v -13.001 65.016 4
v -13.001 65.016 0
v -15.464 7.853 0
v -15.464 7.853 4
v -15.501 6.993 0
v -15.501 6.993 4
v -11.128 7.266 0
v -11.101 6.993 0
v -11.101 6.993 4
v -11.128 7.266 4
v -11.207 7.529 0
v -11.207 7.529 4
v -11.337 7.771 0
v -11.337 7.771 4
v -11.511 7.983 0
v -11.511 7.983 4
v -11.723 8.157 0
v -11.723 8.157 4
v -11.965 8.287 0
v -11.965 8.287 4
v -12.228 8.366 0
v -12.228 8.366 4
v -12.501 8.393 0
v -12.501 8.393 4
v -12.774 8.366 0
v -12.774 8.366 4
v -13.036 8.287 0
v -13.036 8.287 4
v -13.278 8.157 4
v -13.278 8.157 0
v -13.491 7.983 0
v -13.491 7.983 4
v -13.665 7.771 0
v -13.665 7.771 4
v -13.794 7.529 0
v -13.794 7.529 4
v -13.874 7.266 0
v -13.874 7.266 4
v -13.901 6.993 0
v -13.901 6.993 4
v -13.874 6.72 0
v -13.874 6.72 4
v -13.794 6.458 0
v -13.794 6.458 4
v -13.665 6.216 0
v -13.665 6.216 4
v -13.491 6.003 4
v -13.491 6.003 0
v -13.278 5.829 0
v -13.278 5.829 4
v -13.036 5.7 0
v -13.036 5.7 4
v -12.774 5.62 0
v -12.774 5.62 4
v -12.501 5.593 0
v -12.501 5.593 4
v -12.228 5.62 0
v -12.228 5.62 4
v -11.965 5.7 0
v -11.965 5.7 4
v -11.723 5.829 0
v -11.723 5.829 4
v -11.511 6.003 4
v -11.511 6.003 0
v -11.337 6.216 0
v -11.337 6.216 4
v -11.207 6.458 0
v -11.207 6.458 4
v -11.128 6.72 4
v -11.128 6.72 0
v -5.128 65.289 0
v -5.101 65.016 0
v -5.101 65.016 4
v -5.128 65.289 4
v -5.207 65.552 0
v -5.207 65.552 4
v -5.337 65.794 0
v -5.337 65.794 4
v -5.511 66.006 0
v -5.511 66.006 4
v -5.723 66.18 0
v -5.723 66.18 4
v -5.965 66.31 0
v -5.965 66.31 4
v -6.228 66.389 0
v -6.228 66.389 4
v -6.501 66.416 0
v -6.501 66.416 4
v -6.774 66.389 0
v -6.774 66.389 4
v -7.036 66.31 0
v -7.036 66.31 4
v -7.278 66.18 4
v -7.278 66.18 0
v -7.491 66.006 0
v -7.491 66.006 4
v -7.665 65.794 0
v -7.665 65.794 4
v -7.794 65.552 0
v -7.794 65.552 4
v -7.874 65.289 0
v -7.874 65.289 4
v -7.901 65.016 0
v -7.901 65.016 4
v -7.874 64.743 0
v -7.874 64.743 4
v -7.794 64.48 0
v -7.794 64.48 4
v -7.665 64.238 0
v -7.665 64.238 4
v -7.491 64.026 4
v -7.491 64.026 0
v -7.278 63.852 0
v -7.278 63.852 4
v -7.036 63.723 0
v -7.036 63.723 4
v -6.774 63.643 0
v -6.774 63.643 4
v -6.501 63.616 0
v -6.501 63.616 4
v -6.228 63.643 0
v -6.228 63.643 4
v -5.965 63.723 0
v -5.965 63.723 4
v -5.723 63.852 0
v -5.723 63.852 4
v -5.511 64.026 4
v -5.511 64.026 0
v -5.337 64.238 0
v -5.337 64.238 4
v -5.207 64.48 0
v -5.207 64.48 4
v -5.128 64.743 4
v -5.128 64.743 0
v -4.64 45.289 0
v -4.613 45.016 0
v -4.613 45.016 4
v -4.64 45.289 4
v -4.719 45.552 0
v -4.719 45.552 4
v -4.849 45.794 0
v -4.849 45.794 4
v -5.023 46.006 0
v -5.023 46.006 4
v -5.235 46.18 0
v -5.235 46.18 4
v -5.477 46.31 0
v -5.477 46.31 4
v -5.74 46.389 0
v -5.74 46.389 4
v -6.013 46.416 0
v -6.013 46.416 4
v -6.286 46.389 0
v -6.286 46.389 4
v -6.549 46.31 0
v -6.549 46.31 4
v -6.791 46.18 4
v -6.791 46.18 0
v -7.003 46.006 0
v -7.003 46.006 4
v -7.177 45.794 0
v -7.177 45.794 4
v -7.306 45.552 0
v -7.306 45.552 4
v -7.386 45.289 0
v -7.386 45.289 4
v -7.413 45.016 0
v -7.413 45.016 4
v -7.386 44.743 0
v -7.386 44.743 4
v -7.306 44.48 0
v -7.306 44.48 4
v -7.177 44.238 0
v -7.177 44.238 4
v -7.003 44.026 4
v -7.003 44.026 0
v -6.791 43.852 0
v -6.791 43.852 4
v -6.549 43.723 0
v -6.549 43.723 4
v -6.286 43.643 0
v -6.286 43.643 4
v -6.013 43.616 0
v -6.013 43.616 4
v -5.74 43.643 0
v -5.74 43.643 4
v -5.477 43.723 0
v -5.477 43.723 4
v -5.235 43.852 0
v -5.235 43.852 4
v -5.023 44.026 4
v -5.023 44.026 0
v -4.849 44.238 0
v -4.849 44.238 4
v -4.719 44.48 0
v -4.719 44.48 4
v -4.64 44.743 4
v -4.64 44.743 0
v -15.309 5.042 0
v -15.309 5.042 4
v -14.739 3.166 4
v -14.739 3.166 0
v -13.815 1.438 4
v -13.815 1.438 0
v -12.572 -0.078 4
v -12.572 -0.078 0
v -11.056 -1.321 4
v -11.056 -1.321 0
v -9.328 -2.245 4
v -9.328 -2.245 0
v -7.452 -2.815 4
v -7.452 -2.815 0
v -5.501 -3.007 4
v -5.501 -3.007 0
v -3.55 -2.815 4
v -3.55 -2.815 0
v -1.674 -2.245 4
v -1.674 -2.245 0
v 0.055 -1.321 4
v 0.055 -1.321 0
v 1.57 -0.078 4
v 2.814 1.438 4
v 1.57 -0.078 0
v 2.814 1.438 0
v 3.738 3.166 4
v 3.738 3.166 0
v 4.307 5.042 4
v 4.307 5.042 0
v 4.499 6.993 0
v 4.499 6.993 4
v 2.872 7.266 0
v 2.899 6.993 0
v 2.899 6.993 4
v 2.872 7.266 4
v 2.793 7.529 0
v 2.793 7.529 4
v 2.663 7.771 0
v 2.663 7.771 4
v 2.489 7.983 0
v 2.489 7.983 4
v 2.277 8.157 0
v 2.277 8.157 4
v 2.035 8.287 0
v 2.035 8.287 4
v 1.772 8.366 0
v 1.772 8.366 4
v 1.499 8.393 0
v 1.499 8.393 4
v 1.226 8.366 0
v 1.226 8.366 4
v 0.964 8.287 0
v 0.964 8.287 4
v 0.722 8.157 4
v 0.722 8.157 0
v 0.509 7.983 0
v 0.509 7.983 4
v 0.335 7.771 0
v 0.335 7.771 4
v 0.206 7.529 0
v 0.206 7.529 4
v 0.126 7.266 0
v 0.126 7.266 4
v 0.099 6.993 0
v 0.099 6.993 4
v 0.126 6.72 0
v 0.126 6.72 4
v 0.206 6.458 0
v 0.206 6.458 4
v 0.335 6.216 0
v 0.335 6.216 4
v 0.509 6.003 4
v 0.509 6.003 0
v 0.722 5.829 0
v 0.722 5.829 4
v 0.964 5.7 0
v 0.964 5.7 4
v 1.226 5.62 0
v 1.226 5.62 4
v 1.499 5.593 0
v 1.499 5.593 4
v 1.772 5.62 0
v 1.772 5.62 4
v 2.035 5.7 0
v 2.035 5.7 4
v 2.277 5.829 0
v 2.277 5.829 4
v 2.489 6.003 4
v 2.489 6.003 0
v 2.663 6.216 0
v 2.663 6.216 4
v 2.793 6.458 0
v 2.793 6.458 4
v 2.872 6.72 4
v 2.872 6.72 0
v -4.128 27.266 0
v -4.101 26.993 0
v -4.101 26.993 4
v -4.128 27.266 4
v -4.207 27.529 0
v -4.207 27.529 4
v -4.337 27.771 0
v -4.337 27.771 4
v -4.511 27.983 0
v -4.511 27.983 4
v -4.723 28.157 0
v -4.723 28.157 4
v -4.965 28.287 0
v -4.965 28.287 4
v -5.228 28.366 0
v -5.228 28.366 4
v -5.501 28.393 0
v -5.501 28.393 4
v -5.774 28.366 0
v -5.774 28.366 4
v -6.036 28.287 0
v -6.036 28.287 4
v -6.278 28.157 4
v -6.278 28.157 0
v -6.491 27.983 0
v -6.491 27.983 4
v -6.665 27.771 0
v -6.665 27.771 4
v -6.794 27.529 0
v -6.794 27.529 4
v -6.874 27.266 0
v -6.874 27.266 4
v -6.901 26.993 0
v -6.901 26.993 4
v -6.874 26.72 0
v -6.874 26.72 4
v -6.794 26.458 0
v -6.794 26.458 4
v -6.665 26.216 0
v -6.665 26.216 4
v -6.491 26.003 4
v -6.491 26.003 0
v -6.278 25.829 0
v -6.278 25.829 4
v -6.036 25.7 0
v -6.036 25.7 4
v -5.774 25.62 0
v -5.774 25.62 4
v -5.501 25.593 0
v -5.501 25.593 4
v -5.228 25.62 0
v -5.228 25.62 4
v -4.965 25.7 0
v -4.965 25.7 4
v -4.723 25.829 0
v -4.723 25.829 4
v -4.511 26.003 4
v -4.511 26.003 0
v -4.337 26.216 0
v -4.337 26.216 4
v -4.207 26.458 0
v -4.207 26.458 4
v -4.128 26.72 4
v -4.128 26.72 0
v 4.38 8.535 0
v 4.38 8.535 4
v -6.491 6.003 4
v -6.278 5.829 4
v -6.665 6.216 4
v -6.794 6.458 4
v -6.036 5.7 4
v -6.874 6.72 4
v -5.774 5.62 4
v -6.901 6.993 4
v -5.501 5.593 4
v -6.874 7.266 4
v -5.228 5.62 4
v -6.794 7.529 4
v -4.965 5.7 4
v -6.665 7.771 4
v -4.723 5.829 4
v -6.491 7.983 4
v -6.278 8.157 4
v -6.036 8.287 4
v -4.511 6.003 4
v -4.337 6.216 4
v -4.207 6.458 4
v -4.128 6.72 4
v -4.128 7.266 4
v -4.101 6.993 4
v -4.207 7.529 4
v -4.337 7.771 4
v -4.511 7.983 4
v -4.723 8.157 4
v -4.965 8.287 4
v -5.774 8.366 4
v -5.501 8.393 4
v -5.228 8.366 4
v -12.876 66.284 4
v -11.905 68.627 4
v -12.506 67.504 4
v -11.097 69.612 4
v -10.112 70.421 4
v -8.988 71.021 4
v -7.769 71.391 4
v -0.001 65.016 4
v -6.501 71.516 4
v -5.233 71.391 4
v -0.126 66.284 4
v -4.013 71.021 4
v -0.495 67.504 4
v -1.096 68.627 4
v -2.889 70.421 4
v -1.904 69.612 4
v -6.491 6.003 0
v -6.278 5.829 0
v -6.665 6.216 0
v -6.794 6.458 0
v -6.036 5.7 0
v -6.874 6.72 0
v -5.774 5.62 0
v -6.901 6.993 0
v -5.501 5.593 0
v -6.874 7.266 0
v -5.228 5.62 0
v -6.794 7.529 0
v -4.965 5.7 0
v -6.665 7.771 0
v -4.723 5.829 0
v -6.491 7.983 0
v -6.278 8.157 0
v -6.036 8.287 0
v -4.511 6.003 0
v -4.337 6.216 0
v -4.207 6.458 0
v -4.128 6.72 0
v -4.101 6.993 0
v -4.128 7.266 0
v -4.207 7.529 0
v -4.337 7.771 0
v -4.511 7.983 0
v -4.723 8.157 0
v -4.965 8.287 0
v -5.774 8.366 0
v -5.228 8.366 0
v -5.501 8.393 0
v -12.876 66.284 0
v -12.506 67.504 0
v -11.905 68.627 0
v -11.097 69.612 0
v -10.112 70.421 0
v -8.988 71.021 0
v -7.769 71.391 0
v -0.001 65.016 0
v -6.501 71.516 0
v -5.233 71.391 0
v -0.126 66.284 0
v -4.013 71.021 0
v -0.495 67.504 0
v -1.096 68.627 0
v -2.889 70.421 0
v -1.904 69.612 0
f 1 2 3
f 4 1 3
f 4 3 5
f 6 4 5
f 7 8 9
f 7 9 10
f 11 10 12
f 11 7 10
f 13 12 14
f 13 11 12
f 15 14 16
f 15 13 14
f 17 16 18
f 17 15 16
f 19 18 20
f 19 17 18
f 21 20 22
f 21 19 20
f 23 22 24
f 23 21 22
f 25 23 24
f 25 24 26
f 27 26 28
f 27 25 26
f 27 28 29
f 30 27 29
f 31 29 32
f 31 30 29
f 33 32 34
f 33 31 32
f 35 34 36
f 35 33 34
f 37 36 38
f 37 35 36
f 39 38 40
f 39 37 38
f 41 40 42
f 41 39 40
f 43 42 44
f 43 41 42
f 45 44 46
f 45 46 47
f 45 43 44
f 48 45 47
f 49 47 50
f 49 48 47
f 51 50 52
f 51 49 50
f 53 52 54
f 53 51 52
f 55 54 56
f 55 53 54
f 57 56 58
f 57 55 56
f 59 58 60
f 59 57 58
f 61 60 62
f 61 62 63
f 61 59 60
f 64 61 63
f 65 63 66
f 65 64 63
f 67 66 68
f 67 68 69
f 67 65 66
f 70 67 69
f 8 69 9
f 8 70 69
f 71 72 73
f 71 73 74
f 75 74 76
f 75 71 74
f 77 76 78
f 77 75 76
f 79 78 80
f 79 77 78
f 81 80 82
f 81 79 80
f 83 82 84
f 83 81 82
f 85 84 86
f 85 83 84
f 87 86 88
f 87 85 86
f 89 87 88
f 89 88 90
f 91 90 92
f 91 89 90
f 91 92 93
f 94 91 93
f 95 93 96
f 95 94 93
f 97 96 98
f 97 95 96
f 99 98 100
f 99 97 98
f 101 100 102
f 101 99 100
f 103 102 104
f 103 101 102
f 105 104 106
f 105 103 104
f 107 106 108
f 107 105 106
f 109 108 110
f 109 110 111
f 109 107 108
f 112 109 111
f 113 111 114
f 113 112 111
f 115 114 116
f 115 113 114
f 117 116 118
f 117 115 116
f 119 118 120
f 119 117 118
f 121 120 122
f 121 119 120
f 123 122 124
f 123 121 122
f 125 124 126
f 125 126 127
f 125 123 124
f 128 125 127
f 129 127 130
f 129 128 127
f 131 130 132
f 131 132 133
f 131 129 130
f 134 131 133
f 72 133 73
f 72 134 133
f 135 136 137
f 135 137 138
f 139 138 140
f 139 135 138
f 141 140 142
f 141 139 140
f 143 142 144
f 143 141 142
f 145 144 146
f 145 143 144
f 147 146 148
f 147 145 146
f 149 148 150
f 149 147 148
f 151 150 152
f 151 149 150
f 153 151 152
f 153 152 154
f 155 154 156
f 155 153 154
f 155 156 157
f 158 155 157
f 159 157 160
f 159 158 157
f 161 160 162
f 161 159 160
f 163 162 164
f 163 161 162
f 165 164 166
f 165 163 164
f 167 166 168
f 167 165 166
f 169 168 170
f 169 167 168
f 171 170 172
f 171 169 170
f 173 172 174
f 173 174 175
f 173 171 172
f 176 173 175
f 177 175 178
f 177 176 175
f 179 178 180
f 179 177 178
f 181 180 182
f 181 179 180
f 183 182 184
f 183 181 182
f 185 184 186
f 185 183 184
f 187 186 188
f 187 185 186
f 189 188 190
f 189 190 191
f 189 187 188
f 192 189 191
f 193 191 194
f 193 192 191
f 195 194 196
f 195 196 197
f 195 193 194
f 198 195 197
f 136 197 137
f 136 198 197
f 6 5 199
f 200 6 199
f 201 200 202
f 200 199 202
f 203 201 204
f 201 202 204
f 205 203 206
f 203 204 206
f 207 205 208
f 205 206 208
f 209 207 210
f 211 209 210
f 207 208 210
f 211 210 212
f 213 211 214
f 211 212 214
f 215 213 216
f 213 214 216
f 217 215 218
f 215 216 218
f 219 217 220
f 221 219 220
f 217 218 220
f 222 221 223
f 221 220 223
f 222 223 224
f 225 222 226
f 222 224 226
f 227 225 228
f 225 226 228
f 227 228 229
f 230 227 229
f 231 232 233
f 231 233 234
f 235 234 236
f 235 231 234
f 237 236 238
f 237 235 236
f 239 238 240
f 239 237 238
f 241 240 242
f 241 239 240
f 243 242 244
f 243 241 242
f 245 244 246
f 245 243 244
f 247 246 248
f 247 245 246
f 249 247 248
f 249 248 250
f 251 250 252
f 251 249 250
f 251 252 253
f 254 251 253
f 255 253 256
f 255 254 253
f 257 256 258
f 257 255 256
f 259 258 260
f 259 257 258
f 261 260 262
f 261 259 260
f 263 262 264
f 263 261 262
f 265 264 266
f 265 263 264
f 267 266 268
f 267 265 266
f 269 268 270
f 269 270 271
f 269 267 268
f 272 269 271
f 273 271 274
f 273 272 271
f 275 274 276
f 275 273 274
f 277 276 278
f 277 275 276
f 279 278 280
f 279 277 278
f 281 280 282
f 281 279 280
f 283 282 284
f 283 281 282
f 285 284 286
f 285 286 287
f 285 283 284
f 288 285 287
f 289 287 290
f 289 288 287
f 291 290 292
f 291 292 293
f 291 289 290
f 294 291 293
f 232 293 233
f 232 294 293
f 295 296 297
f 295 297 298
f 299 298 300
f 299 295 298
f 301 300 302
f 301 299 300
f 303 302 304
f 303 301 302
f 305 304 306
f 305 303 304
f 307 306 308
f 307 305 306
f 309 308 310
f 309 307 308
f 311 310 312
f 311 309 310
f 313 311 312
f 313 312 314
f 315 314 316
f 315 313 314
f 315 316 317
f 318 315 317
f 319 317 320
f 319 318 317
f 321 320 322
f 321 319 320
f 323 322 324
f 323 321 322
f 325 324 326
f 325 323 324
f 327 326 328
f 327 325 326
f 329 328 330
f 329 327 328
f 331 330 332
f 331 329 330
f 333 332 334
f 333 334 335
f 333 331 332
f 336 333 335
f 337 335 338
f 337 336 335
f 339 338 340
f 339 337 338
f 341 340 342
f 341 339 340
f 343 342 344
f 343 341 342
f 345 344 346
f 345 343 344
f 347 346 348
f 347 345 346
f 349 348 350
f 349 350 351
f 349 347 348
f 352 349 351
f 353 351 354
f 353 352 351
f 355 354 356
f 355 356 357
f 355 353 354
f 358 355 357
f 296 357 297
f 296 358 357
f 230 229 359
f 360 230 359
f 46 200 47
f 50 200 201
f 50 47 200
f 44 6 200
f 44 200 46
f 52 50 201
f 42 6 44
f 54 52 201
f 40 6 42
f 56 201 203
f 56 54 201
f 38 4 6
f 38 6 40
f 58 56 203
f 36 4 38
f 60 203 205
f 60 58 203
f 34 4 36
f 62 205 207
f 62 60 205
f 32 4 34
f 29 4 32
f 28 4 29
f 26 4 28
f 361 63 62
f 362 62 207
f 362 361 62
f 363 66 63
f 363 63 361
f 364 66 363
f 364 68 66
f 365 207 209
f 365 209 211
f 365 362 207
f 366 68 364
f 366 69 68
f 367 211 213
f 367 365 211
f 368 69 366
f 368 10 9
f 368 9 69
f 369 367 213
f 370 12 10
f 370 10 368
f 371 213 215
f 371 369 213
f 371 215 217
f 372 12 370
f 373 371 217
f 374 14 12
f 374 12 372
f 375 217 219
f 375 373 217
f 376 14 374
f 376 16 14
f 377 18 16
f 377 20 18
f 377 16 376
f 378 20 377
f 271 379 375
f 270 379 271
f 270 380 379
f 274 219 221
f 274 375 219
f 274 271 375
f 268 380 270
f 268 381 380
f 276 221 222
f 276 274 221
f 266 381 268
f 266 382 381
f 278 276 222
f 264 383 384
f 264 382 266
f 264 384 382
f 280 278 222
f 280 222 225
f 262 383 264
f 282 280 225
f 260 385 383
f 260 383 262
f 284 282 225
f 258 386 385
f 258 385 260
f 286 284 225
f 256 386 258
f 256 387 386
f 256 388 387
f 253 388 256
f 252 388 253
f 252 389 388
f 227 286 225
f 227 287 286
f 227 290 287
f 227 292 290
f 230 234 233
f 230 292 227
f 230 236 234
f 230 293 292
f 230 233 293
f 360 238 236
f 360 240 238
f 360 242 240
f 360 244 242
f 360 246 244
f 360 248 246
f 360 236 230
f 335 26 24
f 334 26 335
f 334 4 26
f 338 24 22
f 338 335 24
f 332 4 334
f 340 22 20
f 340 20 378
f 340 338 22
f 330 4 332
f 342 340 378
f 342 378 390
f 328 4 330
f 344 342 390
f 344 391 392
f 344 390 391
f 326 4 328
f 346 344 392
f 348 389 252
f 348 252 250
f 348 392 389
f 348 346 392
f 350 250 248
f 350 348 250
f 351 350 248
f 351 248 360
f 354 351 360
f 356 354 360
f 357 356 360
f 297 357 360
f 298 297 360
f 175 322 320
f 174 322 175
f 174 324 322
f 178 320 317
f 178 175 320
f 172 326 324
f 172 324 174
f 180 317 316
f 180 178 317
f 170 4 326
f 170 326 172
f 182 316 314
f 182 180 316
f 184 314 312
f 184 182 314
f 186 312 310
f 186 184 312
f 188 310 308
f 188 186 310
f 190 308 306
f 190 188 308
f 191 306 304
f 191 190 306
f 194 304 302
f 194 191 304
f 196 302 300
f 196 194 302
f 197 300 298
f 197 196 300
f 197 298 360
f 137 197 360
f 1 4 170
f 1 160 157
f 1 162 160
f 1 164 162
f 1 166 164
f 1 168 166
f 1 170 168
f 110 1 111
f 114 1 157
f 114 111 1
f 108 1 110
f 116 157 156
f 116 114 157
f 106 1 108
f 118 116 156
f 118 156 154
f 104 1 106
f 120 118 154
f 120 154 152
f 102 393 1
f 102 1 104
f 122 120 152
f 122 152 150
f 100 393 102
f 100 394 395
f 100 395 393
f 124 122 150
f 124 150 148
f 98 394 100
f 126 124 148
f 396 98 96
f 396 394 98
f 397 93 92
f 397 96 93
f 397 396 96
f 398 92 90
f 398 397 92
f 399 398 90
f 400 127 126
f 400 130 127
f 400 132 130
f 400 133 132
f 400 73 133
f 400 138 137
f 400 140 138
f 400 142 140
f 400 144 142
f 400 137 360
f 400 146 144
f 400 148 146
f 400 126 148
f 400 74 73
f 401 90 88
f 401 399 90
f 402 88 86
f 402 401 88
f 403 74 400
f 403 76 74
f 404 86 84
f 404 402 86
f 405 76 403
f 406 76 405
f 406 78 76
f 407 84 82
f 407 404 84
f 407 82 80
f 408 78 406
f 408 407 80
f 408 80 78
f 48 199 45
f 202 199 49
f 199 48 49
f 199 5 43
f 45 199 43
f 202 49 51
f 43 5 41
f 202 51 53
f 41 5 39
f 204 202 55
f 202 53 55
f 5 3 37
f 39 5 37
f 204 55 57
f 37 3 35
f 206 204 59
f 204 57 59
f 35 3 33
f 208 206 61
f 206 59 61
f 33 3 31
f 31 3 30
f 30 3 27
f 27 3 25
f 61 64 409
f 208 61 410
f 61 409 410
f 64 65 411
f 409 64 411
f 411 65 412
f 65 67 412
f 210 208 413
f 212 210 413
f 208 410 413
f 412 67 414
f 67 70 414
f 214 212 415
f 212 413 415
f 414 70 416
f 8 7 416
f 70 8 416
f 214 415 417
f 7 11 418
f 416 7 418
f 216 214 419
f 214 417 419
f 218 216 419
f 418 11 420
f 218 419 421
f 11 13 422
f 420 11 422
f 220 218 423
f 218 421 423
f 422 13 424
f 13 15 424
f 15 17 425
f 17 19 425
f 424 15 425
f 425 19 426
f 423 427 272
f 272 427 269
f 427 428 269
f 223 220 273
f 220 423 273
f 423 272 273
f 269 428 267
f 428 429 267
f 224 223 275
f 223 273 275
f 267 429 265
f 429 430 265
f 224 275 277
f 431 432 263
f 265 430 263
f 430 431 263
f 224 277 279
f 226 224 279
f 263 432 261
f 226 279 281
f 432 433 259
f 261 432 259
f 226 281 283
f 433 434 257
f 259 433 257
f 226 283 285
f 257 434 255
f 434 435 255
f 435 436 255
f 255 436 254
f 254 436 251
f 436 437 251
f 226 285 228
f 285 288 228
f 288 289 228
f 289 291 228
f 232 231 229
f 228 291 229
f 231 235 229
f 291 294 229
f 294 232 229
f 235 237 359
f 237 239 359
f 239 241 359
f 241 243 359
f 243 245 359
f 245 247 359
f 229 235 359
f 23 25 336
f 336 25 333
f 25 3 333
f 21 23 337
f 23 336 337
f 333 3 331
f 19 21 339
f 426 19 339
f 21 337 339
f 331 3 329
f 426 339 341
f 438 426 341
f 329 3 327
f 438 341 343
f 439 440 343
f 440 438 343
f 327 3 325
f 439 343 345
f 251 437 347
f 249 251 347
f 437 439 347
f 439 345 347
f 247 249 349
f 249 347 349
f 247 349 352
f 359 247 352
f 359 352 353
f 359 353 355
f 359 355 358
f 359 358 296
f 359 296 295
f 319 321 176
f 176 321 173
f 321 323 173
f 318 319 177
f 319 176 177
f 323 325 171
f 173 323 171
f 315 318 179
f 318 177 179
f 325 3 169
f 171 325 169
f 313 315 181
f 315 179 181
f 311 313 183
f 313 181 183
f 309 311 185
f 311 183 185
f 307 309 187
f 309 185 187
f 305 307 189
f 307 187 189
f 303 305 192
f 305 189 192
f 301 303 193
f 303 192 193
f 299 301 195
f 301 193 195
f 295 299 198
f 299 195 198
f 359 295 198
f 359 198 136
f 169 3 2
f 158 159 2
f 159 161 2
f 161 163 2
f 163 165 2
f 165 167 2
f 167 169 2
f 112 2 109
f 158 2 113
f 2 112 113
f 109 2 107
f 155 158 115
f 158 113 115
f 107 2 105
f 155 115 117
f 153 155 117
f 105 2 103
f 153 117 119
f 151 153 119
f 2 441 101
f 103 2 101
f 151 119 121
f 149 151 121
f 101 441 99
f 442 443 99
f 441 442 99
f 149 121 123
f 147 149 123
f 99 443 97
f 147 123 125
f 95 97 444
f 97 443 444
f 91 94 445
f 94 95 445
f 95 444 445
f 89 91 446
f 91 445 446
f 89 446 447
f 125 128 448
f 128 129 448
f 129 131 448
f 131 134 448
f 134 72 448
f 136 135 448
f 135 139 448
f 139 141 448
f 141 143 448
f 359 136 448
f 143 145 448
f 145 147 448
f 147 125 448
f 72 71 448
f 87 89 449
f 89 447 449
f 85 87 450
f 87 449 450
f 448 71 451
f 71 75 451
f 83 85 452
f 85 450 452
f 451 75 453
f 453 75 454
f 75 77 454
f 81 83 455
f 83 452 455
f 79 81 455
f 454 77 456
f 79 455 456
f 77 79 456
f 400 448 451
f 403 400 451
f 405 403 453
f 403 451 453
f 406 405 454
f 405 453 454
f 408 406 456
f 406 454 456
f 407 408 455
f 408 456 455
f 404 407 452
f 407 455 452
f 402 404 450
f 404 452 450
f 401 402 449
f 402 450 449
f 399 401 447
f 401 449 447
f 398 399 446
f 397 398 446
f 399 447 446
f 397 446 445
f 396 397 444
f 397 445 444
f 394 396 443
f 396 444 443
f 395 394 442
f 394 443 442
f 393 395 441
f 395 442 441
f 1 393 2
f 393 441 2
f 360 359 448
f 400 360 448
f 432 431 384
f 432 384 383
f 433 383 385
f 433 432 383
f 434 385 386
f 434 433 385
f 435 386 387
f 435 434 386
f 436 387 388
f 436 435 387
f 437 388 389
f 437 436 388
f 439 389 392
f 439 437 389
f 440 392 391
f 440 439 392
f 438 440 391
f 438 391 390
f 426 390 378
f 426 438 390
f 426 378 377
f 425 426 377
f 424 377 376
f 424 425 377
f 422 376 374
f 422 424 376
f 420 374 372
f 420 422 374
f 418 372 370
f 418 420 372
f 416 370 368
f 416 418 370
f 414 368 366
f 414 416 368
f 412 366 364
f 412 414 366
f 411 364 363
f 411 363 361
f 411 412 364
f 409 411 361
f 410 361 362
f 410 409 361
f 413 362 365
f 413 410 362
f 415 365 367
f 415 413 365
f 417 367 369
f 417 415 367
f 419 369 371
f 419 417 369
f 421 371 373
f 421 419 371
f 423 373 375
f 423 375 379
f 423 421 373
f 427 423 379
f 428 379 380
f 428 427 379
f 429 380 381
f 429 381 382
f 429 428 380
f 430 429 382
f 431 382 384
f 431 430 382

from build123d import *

# Parameters (mm, degrees)
SKETCH1_R           = 1.4
BOSS_EXTRUDE1_DEPTH = 4


with BuildPart() as part:
    # Sketch1 → Boss-Extrude1 (new body)
    with BuildSketch(Plane.XY):
        with BuildLine():
            ThreePointArc((-0.000688459, 65.016091721), (-6.500688459, 71.516091721), (-13.000688459, 65.016091721))
            Line((-13.000688459, 65.016091721), (-15.463628279, 7.853451097))
            Line((-15.463628279, 7.853451097), (-15.500688459, 6.993317296))
            ThreePointArc((-15.500688459, 6.993317296), (-5.500688459, -3.006682704), (4.499311541, 6.993317296))
            Line((4.499311541, 6.993317296), (4.379732895, 8.535158357))
            Line((4.379732895, 8.535158357), (-0.000688459, 65.016091721))
        make_face()
        with Locations((-12.500688459, 6.993317296)):
            Circle(SKETCH1_R, mode=Mode.SUBTRACT)
        with Locations((-5.500688459, 6.993317296)):
            Circle(SKETCH1_R, mode=Mode.SUBTRACT)
        with Locations((1.499311541, 6.993317296)):
            Circle(SKETCH1_R, mode=Mode.SUBTRACT)
        with Locations((-5.500688459, 26.993317296)):
            Circle(SKETCH1_R, mode=Mode.SUBTRACT)
        with Locations((-6.012756351, 45.016091721)):
            Circle(SKETCH1_R, mode=Mode.SUBTRACT)
        with Locations((-6.500688459, 65.016091721)):
            Circle(SKETCH1_R, mode=Mode.SUBTRACT)
    extrude(amount=BOSS_EXTRUDE1_DEPTH)


solid = part.part
